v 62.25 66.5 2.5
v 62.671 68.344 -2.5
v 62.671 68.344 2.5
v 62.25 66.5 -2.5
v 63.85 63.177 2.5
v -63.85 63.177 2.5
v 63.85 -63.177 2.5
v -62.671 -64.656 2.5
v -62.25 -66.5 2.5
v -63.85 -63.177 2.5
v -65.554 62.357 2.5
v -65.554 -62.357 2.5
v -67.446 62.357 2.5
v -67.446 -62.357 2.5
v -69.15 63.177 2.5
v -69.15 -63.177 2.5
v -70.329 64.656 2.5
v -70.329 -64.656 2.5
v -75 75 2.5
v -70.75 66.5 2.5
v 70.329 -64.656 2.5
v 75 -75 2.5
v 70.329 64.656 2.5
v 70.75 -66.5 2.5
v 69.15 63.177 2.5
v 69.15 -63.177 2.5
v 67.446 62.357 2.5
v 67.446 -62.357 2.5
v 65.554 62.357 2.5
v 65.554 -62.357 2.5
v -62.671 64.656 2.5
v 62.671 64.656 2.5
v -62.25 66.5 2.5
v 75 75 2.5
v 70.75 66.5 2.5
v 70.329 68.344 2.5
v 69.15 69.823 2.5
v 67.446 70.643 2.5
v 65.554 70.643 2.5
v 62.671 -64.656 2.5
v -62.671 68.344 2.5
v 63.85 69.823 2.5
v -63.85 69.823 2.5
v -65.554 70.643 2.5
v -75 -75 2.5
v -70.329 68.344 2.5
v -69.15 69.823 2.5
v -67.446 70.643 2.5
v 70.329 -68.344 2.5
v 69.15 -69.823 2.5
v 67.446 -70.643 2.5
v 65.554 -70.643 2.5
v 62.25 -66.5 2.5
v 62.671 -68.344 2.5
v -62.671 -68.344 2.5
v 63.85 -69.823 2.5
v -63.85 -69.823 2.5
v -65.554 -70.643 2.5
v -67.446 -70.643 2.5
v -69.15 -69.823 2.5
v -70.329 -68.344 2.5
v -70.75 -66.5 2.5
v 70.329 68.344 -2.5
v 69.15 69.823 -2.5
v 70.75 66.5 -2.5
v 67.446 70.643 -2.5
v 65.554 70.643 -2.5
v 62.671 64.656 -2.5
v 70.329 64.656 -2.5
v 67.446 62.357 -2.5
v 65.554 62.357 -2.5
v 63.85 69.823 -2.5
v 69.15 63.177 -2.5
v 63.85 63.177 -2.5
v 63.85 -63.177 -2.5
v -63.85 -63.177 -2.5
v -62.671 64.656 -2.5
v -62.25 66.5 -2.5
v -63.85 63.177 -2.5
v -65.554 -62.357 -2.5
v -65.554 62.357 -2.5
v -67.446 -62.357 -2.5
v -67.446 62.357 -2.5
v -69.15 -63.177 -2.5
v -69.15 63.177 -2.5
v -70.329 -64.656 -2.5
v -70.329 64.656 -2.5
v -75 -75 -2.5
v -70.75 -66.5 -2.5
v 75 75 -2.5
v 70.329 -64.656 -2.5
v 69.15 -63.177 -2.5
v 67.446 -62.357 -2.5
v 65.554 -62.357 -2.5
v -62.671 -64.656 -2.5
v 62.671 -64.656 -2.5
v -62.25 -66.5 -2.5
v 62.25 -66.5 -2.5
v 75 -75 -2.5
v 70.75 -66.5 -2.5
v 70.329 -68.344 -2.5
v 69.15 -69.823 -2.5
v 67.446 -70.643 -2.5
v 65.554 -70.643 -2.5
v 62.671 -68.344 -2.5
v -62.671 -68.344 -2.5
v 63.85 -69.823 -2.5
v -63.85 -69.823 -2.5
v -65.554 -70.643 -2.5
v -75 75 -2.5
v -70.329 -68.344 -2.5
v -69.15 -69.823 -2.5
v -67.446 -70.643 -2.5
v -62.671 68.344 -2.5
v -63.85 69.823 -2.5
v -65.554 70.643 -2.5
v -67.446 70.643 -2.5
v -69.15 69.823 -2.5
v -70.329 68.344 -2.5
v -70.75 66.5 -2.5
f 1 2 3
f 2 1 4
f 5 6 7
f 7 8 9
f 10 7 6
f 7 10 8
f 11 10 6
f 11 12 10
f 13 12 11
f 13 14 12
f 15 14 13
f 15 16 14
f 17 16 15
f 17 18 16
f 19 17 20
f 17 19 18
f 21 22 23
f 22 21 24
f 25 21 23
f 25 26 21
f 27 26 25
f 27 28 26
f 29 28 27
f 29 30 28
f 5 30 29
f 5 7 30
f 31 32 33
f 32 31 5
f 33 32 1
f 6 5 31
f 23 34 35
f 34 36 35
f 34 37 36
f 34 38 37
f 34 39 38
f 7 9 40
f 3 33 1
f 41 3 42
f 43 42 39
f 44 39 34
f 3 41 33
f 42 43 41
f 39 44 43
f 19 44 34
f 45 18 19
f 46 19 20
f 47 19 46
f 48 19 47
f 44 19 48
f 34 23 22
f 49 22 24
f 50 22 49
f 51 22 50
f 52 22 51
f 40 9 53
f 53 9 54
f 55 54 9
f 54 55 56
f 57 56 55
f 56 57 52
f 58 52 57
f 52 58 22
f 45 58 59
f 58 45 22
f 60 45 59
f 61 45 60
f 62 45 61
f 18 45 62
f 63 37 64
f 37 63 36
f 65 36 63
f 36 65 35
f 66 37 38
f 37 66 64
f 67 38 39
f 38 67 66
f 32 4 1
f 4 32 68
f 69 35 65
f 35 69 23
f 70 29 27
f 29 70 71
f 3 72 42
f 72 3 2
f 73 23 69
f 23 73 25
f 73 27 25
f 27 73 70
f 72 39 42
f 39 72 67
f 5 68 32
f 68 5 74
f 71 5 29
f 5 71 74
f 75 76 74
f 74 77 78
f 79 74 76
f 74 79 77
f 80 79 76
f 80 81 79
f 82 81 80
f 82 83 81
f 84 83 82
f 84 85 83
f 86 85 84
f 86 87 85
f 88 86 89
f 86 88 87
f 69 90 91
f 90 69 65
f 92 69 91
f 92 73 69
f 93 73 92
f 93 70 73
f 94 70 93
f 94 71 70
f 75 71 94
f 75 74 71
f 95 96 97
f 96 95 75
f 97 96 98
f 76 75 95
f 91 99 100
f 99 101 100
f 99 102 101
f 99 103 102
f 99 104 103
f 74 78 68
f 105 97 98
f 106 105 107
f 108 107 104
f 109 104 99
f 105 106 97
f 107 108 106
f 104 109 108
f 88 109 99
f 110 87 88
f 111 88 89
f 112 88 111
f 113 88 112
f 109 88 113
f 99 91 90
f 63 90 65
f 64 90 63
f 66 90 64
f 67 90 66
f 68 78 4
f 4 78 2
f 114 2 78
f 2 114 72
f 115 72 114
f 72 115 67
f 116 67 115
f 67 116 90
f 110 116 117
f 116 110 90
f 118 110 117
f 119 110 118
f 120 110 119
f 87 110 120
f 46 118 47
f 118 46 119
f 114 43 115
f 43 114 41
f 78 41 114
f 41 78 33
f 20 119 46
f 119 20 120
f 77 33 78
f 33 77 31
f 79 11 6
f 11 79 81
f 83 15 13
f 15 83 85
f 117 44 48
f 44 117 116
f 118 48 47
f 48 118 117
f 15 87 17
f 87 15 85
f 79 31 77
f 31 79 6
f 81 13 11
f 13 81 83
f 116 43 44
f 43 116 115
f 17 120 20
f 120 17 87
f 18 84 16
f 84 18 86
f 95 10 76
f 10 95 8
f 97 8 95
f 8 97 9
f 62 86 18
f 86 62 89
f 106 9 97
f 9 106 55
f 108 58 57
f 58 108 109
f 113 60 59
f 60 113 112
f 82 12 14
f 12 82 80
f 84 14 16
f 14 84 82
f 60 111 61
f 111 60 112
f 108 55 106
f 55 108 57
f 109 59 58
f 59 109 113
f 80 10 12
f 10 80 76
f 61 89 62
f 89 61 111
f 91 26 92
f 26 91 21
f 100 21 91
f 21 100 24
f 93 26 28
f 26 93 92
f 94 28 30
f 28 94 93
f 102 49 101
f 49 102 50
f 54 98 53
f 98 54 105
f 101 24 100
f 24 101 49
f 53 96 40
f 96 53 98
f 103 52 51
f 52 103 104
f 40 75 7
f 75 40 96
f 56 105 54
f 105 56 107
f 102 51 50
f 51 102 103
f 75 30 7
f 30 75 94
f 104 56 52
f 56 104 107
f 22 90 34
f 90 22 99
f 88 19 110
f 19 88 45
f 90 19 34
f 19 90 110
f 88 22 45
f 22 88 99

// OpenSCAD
// Generated by SolidPython 1.1.3 on 2023-10-16 11:59:45


difference() {
	cube(center = true, size = [150, 150, 5]);
	union() {
		translate(v = [66.5000000000, 66.5000000000]) {
			cylinder(center = true, h = 5, r = 4.2500000000);
		}
		translate(v = [-66.5000000000, 66.5000000000]) {
			cylinder(center = true, h = 5, r = 4.2500000000);
		}
		translate(v = [-66.5000000000, -66.5000000000]) {
			cylinder(center = true, h = 5, r = 4.2500000000);
		}
		translate(v = [66.5000000000, -66.5000000000]) {
			cylinder(center = true, h = 5, r = 4.2500000000);
		}
	}
}
/***********************************************
*********      SolidPython code:      **********
************************************************
 
import solid
import numbers
import pudb
from solid.utils import *
import viewscad
import subprocess
import os
import os.path as osp
import math
import sys

chamfer_extrude=solid.import_scad("./chamfer_extrude.scad")
chamfer_extrude=chamfer_extrude.chamfer_extrude
r = viewscad.Renderer(width=800, height=800)

def debug(model,f_name,path="/home/ts/code/projects/mfd/designs/debug"):
    solid.scad_render_to_file(model,osp.join(path,f_name)+".scad")
#generate position list of wells using offset from center
wells_pos_from_center_4 = lambda offset: [[-offset,offset],
                                        [offset, offset],
                                        [-offset, -offset],
                                        [offset, -offset]]
#wells_pos_from_center_2 = lambda offset: [[0,offset],
#                                        [0, -offset]]
wells_pos_from_center_2 = lambda offset: [[offset,0],
                                        [-offset,0]]

def make_well(dims,shape=None,height=None,dxf=False):
    def circle_cylinder():
        if dxf or (height is None):
            well = solid.circle(r=dims, segments=64)
        else:
            well = solid.cylinder(r=dims, h=height, segments=64, center = True)
        return well
    if dims is None:
        sys.exit("radius needs to be a number")
    if isinstance(dims, numbers.Number):
        well =circle_cylinder()
    elif len(dims)==1:
        if isinstance(dims[1], numbers.Number):
            well =circle_cylinder()
        else:
            sys.exit("radius needs to be a number")
    elif len(dims)==2:
        well = solid.square(dims,center = True)
    elif len(dims)==3:
        well = solid.cube(dims, center = True)
    return well

def wells_top_bottom(center_gap,device_dims=None,shape=None,height=None, positions = None, dxf = False):
    well_shape = make_well(device_dims,shape=shape,height=height,dxf=dxf)
    wells = []
    if positions is None:
        offset = radius+radius/2.0
        positions = wells_pos_from_center_2(offset)
    if dxf or (height is None):
        height = 0
    for position in positions:
        if dxf:
            wells.append(solid.translate([position[0],position[1]])(well_shape))
        else:
            wells.append(solid.translate([position[0],position[1],height/2.0])(well_shape))
    return  union()(*wells)

#place wells in four corners 
def four_corner(radius,height=None, positions = None, dxf = False):
    #if well pos not specified set
    #to equally spaced by half radius
    if positions is None:
        offset = radius+radius/2.0
        positions = wells_pos_from_center_4(offset)
    if dxf or (height is None):
        height = 0
    #make wells at positions with specified radius and height
    wells = []
    for position in positions:
        #make circle if making dxf
        if dxf:
            well_shape = solid.circle(r=radius, segments=64)
            well_shape = solid.translate([position[0],position[1]])(well_shape)
        #if stl make cylinder
        else:
            well_shape = solid.cylinder(r=radius, h=height, segments=64, center = True)
            well_shape = solid.translate([position[0],position[1],height/2.0])(well_shape)
        wells.append(well_shape)
    return  union()(*wells)

#generate channels 
def make_channels(length,width,height=0,num_chans=1,max_chans=None,spacing=None, dxf = False,
                  rotate_channels=False):
    if dxf or (height is None):
        height = 0
    #if channel gap not defined, is equal to
    if spacing is None: spacing = width
    #calculate number of channels if fitting max num within given width
    if not max_chans is None:
        import math
        num_chans = math.floor((max_chans-spacing)/(width+spacing))
    #get total width of channel section  
    total_width = (width*num_chans)+(spacing*(num_chans-1))

    #make template channel
    #if rotate_channels: width, length = length, width
    if dxf:
        channel_t = solid.square([length,width],center = True)
    else:
        channel_t = solid.cube([length,width,height], center = True)

    #if number channels is even, offset the first channel to center its gap
    if num_chans % 2 == 0: centering = -(width/2.0+spacing/2.0)
    else: centering = 0
    #move template channel up to align bottom at z = 0 
    #and offset center if necessary
    if dxf:
        channel_t = solid.translate([0,centering])(channel_t)
    else:
        channel_t = solid.translate([0,centering,height/2.0])(channel_t)

    #if rotate_channels: length,width = width,length
    #start making the channels
    channels = []
    for i in range(num_chans):
        #if i=0 there is no translation
        #if i=1, we make the first channel adjacent to second
        direction = i

        #if i>=1, we add channels alternating left and right
        if i >= 1:
            direction = -(i/2.0)
            if i % 2 == 1: direction = (-direction)+0.5
                
        #make channel at right position and add it to channel list
        translation_coords = [0,direction*(width+spacing)]
        #if rotate_channels: translation_coords = [direction*(width+spacing),0]
        if dxf:
            channel = solid.translate(translation_coords)(channel_t)
        else:
            channel = solid.translate([*translation_coords,0])(channel_t)
        channels.append(channel)
    
    #group all channels as one object
    channels = union()(*channels)
    #compute the x,y,z dimensions in order to pass as arguments 
    #for construction of other parts of device (such as the chambers)
    measurements = {'x':(length/2.0,-length/2.0),
                    'y':(total_width/2.0,-total_width/2.0)}
    if not dxf:
        measurements['z'] = (height,0)
    if rotate_channels:
        channels = solid.rotate(90)(channels)
        measurements['x'],measurements['y']=measurements['y'],measurements['x']
    return channels,measurements

def make_chambers(msrs,height=None,extra=0,len_until=None,width=None, dxf = False):
    #computes x,y,z length
    total = lambda x : abs(x[0]) + abs(x[1])
    
    #if specific height if specified
    #otherwise use same height as channels
    if dxf:
        pass
    elif not height is None:
        msrs['z'] = (height,0)
    else:
        msrs['z'] = (0,0)
        
    #make copy of measurements from channels to modify chamber dimensions 
    #and add length to chambers as specified
    chamber_dims = msrs.copy()
    #calculate length of chamber to reach specified offset
    if not len_until is None:
        chamber_len = len_until-(msrs['x'][0])
    #or add specified length to channel length (if not specified, adds 0)
    else:
        chamber_len = msrs['x'][0]+extra
    #set the chamber length based 
    chamber_dims['x'] = (chamber_len/2.0,-(chamber_len/2.0))
    #compute final dimensions of chamber
    if not width is None:
        chamber_dims['y'] = (width/2.0,-width/2.0)
    chamber_dims = [total(size) for size in chamber_dims.values()]
        
    #calculate chamber translation offset to place adjacent to channels
    chamber_trslt = msrs['x'][0]+(chamber_len/2.0)
    #compute chamber translation coordinates to align with channels
    #x = 1 moves chamber above channels
    #x = -1 moves chamber below channels
    if dxf:
        trslt = lambda x : [x*(chamber_trslt),0]
    else:
        trslt = lambda x : [x*(chamber_trslt),0,msrs['z'][0]/2.0]
    
    #function to make chamber at top or at bottom 
    if dxf:
        move = lambda x : solid.translate(trslt(x))(solid.square(chamber_dims, center = True) )
    else:
        move = lambda x : solid.translate(trslt(x))(solid.cube(chamber_dims,center = True))
    #make top and bottom chambers and return them as grouped
    top = move(1)
    bottom = move(-1)
    #chambers=solid.rotate(90)(solid.union()(top,bottom))
    chambers=(solid.union()(top,bottom))

    return chambers

#create alignment features 
def alignment_features(unit,dims,grid_size, mask_size = None, alignment = "hollow", units_from_center = (2.5,2.5), corner_len=None):
    width = grid_size[0]*dims[0]
    length = grid_size[1]*dims[1]
    if mask_size is None and corner_len is None:
        corner_len = (dims[0] + dims[1]) /2 / 8
    corner = lambda thickness_div : solid.union()( solid.square([corner_len,corner_len/thickness_div],center=False), solid.square([corner_len/thickness_div,corner_len],center=False) )
    
    def make_full(thickness_div):
        thickness = corner_len/thickness_div
        tr = solid.translate([0, 0, 0 ])(solid.rotate(180)(corner(thickness_div)))
        tr = solid.translate([thickness/2,thickness/2,0])(tr)
        bl = solid.translate([0, 0, 0 ])(solid.rotate(0)(corner(thickness_div)))
        bl = solid.translate([-thickness/2,-thickness/2,0])(bl)
        return solid.union()(tr,bl)
    
    def make_hollow(thickness_div):
        thickness = corner_len/(thickness_div/2)
        inner = make_full(thickness_div)
        outer = make_full(thickness_div/2)
        hollow = outer - inner 
        return hollow
    
    center = (width /2 , length/2)
    mask_pos = lambda x,y : (center[0] + x*(float(units_from_center[0])*dims[0]), center[1] + y*(float(units_from_center[1])*dims[1]))
    positions = []
    positions.append(mask_pos(1,0))
    positions.append(mask_pos(0,1))
    positions.append(mask_pos(-1,0))
    positions.append(mask_pos(0,-1))
    make_mask = lambda mtype : make_hollow(8) if mtype == "hollow" else make_full(8)
    masks = [ solid.translate([*position,0])(make_mask(alignment)) for position in positions]
    
    solid.scad_render_to_file(solid.union()(*masks),"./designs/open_chamber/masks.scad")
    #return unit - solid.union()(*masks)
    return solid.union()(*masks,unit)

def create_outline(thickness, array, dims, grid_size,):
    width = grid_size[0]*dims[0] + thickness *2
    length = grid_size[1]*dims[1] + thickness *2
    outer = solid.translate([-thickness, -thickness,0])(solid.square([width, length]))
    return outer-array

def create_wall(wall_thickness, outline_thickness, dims, grid_size, wall_height = 2000, dxf = False):
    inner_width = grid_size[0]*dims[0] + outline_thickness *2
    inner_length = grid_size[1]*dims[1] + outline_thickness *2
    outer_width = inner_width + wall_thickness * 2
    outer_length = inner_length + wall_thickness * 2
    outer_pos_x = -outline_thickness-wall_thickness
    outer_pos_y = -outline_thickness-wall_thickness
    inner_pos_x = -outline_thickness
    inner_pos_y = -outline_thickness
    if dxf:
        inner_wall = solid.translate([inner_pos_x,
                                      inner_pos_y,
                                      0])(solid.square([inner_width, inner_length]))
        outer_wall = solid.translate([outer_pos_x,
                                      outer_pos_y,
                                      0])(solid.square([outer_width, outer_length]))

        return outer_wall-inner_wall
    else:
        inner_wall = solid.translate([inner_pos_x,
                                      inner_pos_y,
                                      0])(solid.cube([inner_width, inner_length,wall_height]))
        outer_wall = solid.translate([outer_pos_x,
                                      outer_pos_y,
                                      0])(solid.cube([outer_width, outer_length,wall_height]))

        return outer_wall-inner_wall, {'wall_height': wall_height,
                                       'wall_thickness': wall_thickness,
                                       'inner_width':inner_width,
                                       'inner_length': inner_length,
                                       'outer_width': outer_width,
                                       'outer_length': outer_length,
                                       'outer_pos_x' : outer_pos_x,
                                       'outer_pos_y' : outer_pos_y,
                                       'inner_pos_x' : inner_pos_x,
                                       'inner_pos_y' : inner_pos_y}

def create_thicker_wall(wall_thickness, outer_wall_offset, wall_dims, dims, grid_size, height_start = .2, height_end=2, dxf = False):
    addon_wall,thicker_wall_dims = create_wall(wall_thickness, outer_wall_offset, dims, grid_size, wall_height=height_end-height_start, dxf = False)
    addon_wall = solid.translate([0,0,height_start])(addon_wall)

    thicker_wall_dims['wall_height'] = height_end
    thicker_wall_dims['wall_thickness'] = wall_dims['wall_thickness'] + wall_thickness
    return addon_wall, thicker_wall_dims
 
def add_lock_to_wall(wall,wall_dims,y_offset = 0,cut_ratio=0.7,L_length=3, gap_ratio=0.05, axis="x",width_ratio=1/2):
    # Makes L shape
    def make_L(max_length,length_thickness,max_width,width_thickness,height,y_offset):
        length = solid.cube([max_length,length_thickness,height])
        width = solid.cube([width_thickness,max_width,height])
        width = solid.translate([max_length-(width_thickness),0,0])(width)
        L = solid.union()(width,length)
        debug(L,"L")
        if axis == "x":
            L = solid.rotate(-90)(L)
            L = solid.translate([0,max_length,0])(L)
        else:
            L = solid.rotate(-180)(L)
            L = solid.translate([max_length,max_width,0])(L)
        return solid.translate([0,0,y_offset])(L)
    
    lock_length = L_length
    lock_width = wall_dims['wall_thickness']*width_ratio
    lock_length_thickness = lock_width/2
    lock_width_thickness = lock_width/2
    L_lock = make_L(lock_length,lock_length_thickness,lock_width,lock_width_thickness, wall_dims['wall_height']-y_offset, y_offset)
    
    margin_space = lock_length - lock_length*(1-gap_ratio)
    key_length = lock_length-margin_space
    key_length_thickness = lock_length_thickness-(margin_space*2)
    key_width = lock_width-(margin_space*2)
    key_width_thickness = lock_width_thickness-(margin_space*2)
    L_key = make_L(key_length,key_length_thickness,key_width,key_width_thickness, wall_dims['wall_height']-y_offset, y_offset)
    L_key = solid.translate([margin_space,margin_space,0])(L_key)
    L = solid.union()(L_lock,L_key)
    debug(L,"L")
    
    #Make cube to be used as negative to split frame in a half
    #Can choose if making left or right negative, specify ratio of split
    def make_negative(right,cut_ratio):
        if axis == "x":
            if right:
                length = wall_dims['outer_length']*(1-cut_ratio)
                pos_x = wall_dims['outer_pos_x']+(wall_dims['outer_length']*cut_ratio)
            else:
                length = wall_dims['outer_length']*(cut_ratio)
                pos_x = wall_dims['outer_pos_x'] 
            negative = solid.cube([wall_dims['outer_width'],length, wall_dims['wall_height']])
            negative = solid.translate([wall_dims['outer_pos_y'],pos_x,0])(negative)
        else:
            if right:
                length = wall_dims['outer_width']*(1-cut_ratio)
                pos_x = wall_dims['outer_pos_y']+(wall_dims['outer_width']*cut_ratio)
            else:
                length = wall_dims['outer_width']*(cut_ratio)
                pos_x = wall_dims['outer_pos_y'] 
            negative = solid.cube([length,wall_dims['outer_length'], wall_dims['wall_height']])
            negative = solid.translate([pos_x,wall_dims['outer_pos_x'],0])(negative)
        return negative, pos_x, length 
                      
    #Make negatives
    negative_right, right_half_pos_x, right_half_length = make_negative(True,cut_ratio)
    negative_left, left_half_pos_x, right_half_length = make_negative(False,cut_ratio)
    #Make halves
    left_half = solid.difference()(wall,negative_right)
    right_half = solid.difference()(wall,negative_left)
    def place_L(L, L_length,L_width):
        #Place L on top wall       
        offset_to_center = (wall_dims['wall_thickness']-L_width)/2
        if axis == "x":
            y_pos_top = (wall_dims['outer_pos_y'] +
                    wall_dims['outer_width'] - 
                    L_width - offset_to_center)
            top_L = solid.translate([y_pos_top,
                                     right_half_pos_x-(L_length),
                                     0])(L)
            #Place L on bottom wall       
            y_pos_bottom = wall_dims['outer_pos_y']+offset_to_center
            bottom_L = solid.translate([y_pos_bottom,
                                        right_half_pos_x-L_length,
                                        0])(L)
        else:
            y_pos_top = (wall_dims['outer_pos_x'] +
                    wall_dims['outer_length'] -
                    (L_width+offset_to_center))
            top_L = solid.translate([right_half_pos_x-L_length,
                                     y_pos_top,
                                     0])(L)
            #Place L on bottom wall       
            y_pos_bottom = wall_dims['outer_pos_y']+offset_to_center
            bottom_L = solid.translate([right_half_pos_x-L_length,
                                        y_pos_bottom,
                                        0])(L)
        return bottom_L, top_L
    #Make complimentary L pieces through union and differences
    #Make Lock
    bottom_L_lock, top_L_lock = place_L(L_lock,L_length,lock_width)
    left_half = solid.difference()(left_half,bottom_L_lock)
    left_half = solid.difference()(left_half,top_L_lock)
    #Make Key
    bottom_L_key, top_L_key = place_L(L_key,L_length,lock_width)
    right_half = solid.union()(right_half,bottom_L_key)
    right_half = solid.union()(right_half,top_L_key)
    return left_half, right_half


#build a row x col grid of containment units
def make_unit_array(unit,dims,grid_size, dxf = False, alignment = None, mask_size = None,
                    units_from_center = None,alignment_offset=None, alignment_mark_size=1):
    units = []
    for col in range(grid_size[1]):
        for row in range(grid_size[0]):
            if dxf:
                units.append(solid.translate([row*dims[0],col*dims[1]])(unit))
            else:
                units.append(solid.translate([row*dims[0],col*dims[1],dims[2]/2.0])(unit))
    array = solid.union()(*units)
    if (not alignment is None) and dxf:
        if not alignment_offset is None:
            array = solid.translate([alignment_offset[0],alignment_offset[1]])(array)
        array = alignment_features(array,dims, grid_size, alignment = alignment, mask_size = None, units_from_center = units_from_center,corner_len=alignment_mark_size)
        if not alignment_offset is None:
            array = solid.translate([-alignment_offset[0],-alignment_offset[1]])(array)
    return array


def make_taylor(wells_pos = wells_pos_from_center_4(2.25), well_rad = 1.5 ,
                well_height = 2, chan_w = 0.01, chan_l = 1, chan_h = 0.010 ,
                chan_gap = 0.040, max_chans = None,num_chans=100, chamber_height  = 0.100,
                columns = 1, rows = 1, chamber_len_until=2.25, add_channels = True, add_wells = True, 
                add_chambers = True, save_path = "./", alignment = None, units_from_center = 2,
                mask_size = None, render_stl = False, outline_thickness = 0.050, dxf = True,
                wall_height = 15, wall_thickness = 0.95, casing_x=9, casing_y=9, casing_z=0,rotate_units=0):

    dims = [casing_x, casing_y, casing_z]
    wells = four_corner(well_rad,well_height, dxf = dxf, positions = wells_pos)
    debug(wells,"wells")
    channels, msrs = make_channels(chan_l,chan_w,chan_h,dxf=dxf, spacing = chan_gap, max_chans=max_chans,num_chans=num_chans)
    debug(channels,"channels")
    chambers = make_chambers(msrs,dxf = dxf, height=chamber_height,len_until=chamber_len_until)
    debug(chambers,"chambers")

    #add together and render
    device_parts = []
    if add_channels:
        device_parts.append(channels)
    if add_wells:
        device_parts.append(wells)
    if add_chambers:
        device_parts.append(chambers)
    device=union()(*device_parts)
    device = rotate(rotate_units)(device)

    device=solid.translate([dims[0]/2.0,dims[1]/2.0,0])(device)
    channels = rotate(rotate_units)(channels)
    channels=solid.translate([dims[0]/2,dims[1]/2,0])(channels)
    chambers_wells = union()(wells,chambers)
    chambers_wells = rotate(rotate_units)(chambers_wells)
    chambers_wells=solid.translate([dims[0]/2,dims[1]/2,0])(chambers_wells)

    file_name = str(rows)+'x'+str(columns)+'_units_'
    grid_size = [rows,columns]

    if alignment:
        alignment="full"
    device = make_unit_array(device,dims,grid_size, dxf=dxf, alignment = alignment,
                                 units_from_center = units_from_center)
    channels = make_unit_array(channels,dims,grid_size, dxf=dxf, alignment = alignment,
                                 units_from_center = units_from_center)
    if alignment=="full":
        alignment="hollow"

    chambers_wells = make_unit_array(chambers_wells,dims,grid_size, dxf=dxf, alignment = alignment,
                                 units_from_center =units_from_center)

    def save_model(model,prefix):
        model_fname = os.path.abspath(save_path+prefix+"_"+file_name+".scad")
        solid.scad_render_to_file(model,model_fname)
        return model_fname

    wells_fname = save_model(wells,"wells")
    channels_fname = save_model(channels,"channels")
    device_fname = save_model(device,"device")
    chambers_wells_fname = save_model(chambers_wells,"chambers_wells")
    return (chambers_wells,chambers_wells_fname), (channels,channels_fname), (device,device_fname)

def make_device(design='open',rows=8,columns=6,wells_pos = 4.5,well_offset=3.2, well_rad=3.2,well_height=0.1,
                chan_l=1,chan_w=0.01,chan_h=0.01,chan_gap=0.015,num_chans=101,dxf=True,save_path="./designs/open_chamber/",
                casing_x=9.0,casing_y=18.0,casing_z=0,rotate_units=90,units_from_center=(3,1),chamber_len_until=4.5,
                chamber_width=None,alignment=True, add_wells=True, add_channels=True,add_chambers=True):

    dims = [casing_x, casing_y, casing_z]
    if design == "open":
        wells_pos=wells_pos_from_center_2(wells_pos)
        wells = wells_top_bottom(well_offset*2,device_dims=well_rad,height=well_height, dxf = dxf, positions = wells_pos)
    elif design == "closed":
        wells_pos=wells_pos_from_center_4(wells_pos)
        debug(wells,"wells")
        wells = four_corner(well_offset,well_heightdevice_dims=well_rad, dxf = dxf, positions = wells_pos)
    else:
        print(design+" is not a valid design.\n Choose valid design: 'open' or 'closed'")
        exit()
    wells = rotate(rotate_units)(wells)
    wells=solid.translate([dims[0]/2,dims[1]/2,0])(wells)
    debug(wells,"wells")

    channels, msrs = make_channels(chan_l,chan_w,chan_h,dxf=dxf, spacing = chan_gap, num_chans=num_chans,rotate_channels=False)
    channels = rotate(rotate_units)(channels)
    channels=solid.translate([dims[0]/2,dims[1]/2,0])(channels)

    chambers=make_chambers(msrs,height=None,extra=0,len_until=chamber_len_until, width=chamber_width,dxf = dxf)
    chambers = rotate(rotate_units)(chambers)
    chambers=solid.translate([dims[0]/2,dims[1]/2,0])(chambers)

    device_parts = []
    if add_channels:
        device_parts.append(channels)
    if add_wells:
        device_parts.append(wells)
    if add_chambers:
        device_parts.append(chambers)
    device = union()(*device_parts)
    #device = rotate(rotate_units)(device)
    #device=solid.translate([dims[0]/2.0,dims[1]/2.0,0])(device)

    chambers_wells = []
    if add_chambers:
        chambers_wells.append(chambers)
    if add_wells:
        chambers_wells.append(wells)
    chambers_wells = union()(*chambers_wells)
    #chambers_wells = union()(wells,chambers)
    #chambers_wells = rotate(rotate_units)(chambers_wells)
    #chambers_wells=solid.translate([dims[0]/2,dims[1]/2,0])(chambers_wells)

    file_name = str(rows)+'x'+str(columns)+'_units_'

    grid_size = [rows,columns]
    if alignment:
        alignment="full"
    device = make_unit_array(device,dims,grid_size, dxf=dxf, alignment = alignment,
                                 units_from_center = units_from_center)
    channels = make_unit_array(channels,dims,grid_size, dxf=dxf, alignment = alignment,
                                 units_from_center = units_from_center)
    if alignment=="full":
        alignment="hollow"

    chambers_wells = make_unit_array(chambers_wells,dims,grid_size, dxf=dxf, alignment = alignment,
                                 units_from_center =units_from_center)

    def save_model(model,prefix):
        model_fname = os.path.abspath(save_path+prefix+"_"+file_name+".scad")
        solid.scad_render_to_file(model,model_fname)
        return model_fname

    wells_fname = save_model(wells,"wells")
    channels_fname = save_model(channels,"channels")
    device_fname = save_model(device,"device")
    chambers_wells_fname = save_model(chambers_wells,"chambers_wells")
    return (chambers_wells,chambers_wells_fname), (channels,channels_fname), (device,device_fname)


def make_open_chamber(rows=8,columns=6,wells_pos = wells_pos_from_center_2(4.5), well_rad=3.2,well_height=0.1,
                      chan_l=1,chan_w=0.01,chan_h=0.01,chan_gap=0.015,num_chans=101,dxf=True,save_path="./designs/open_chamber/",
                      casing_x=9.0,casing_y=18.0,casing_z=0,rotate_units=90,units_from_center=(3,1),chamber_len_until=4.5,
                      chamber_width=None,alignment=True, add_wells=True, add_channels=True,add_chambers=True):

    dims = [casing_x, casing_y, casing_z]
    wells = wells_top_bottom(well_rad,height=well_height, dxf = dxf, positions = wells_pos)
    channels, msrs = make_channels(chan_l,chan_w,chan_h,dxf=dxf, spacing = chan_gap, num_chans=num_chans,rotate_channels=False)
    chambers=make_chambers(msrs,height=None,extra=0,len_until=chamber_len_until, width=chamber_width,dxf = dxf)
    debug(chambers,"chambers")
    device_parts = []
    if add_channels:
        device_parts.append(channels)
    if add_wells:
        device_parts.append(wells)
    if add_chambers:
        device_parts.append(chambers)
    device = union()(*device_parts)
    device = rotate(rotate_units)(device)
    device=solid.translate([dims[0]/2.0,dims[1]/2.0,0])(device)
    channels = rotate(rotate_units)(channels)
    channels=solid.translate([dims[0]/2,dims[1]/2,0])(channels)
    chambers_wells = union()(wells,chambers)
    chambers_wells = rotate(rotate_units)(chambers_wells)
    chambers_wells=solid.translate([dims[0]/2,dims[1]/2,0])(chambers_wells)

    file_name = str(rows)+'x'+str(columns)+'_units_'

    grid_size = [rows,columns]
    if alignment:
        alignment="full"
    device = make_unit_array(device,dims,grid_size, dxf=dxf, alignment = alignment,
                                 units_from_center = units_from_center)
    channels = make_unit_array(channels,dims,grid_size, dxf=dxf, alignment = alignment,
                                 units_from_center = units_from_center)
    if alignment=="full":
        alignment="hollow"

    chambers_wells = make_unit_array(chambers_wells,dims,grid_size, dxf=dxf, alignment = alignment,
                                 units_from_center =units_from_center)

    def save_model(model,prefix):
        model_fname = os.path.abspath(save_path+prefix+"_"+file_name+".scad")
        solid.scad_render_to_file(model,model_fname)
        return model_fname

    wells_fname = save_model(wells,"wells")
    channels_fname = save_model(channels,"channels")
    device_fname = save_model(device,"device")
    chambers_wells_fname = save_model(chambers_wells,"chambers_wells")
    return (chambers_wells,chambers_wells_fname), (channels,channels_fname), (device,device_fname)

def to_dxf(scad_path):
    dxf_path = scad_path.replace(".scad",".dxf")
    subprocess.call(["openscad", "-o", dxf_path, scad_path])
    import ezdxf
    temp_dxf = ezdxf.readfile(dxf_path)
    temp_dxf.saveas(dxf_path)

#def make_walls(diameter,thickness,grid_size,dims,height=20,segments=256,make_inner=True):
#    wafer_wall_out = solid.cylinder(r=diameter/2,h=height, segments=segments)
#    wafer_wall_in = solid.cylinder(r=(diameter/2-thickness),h=height, segments=segments)
#    wafer_wall = solid.difference()(wafer_wall_out,wafer_wall_in)
#    wafer_wall = solid.translate([grid_size[1]*dims[1]/2.0,grid_size[0]*dims[0]/2.0])(wafer_wall)
#
#    vertical_wall_length = grid_size[1]*dims[1]
#    horizontal_wall_length = grid_size[0]*dims[0]
#    vertical_wall = solid.cube([vertical_wall_length,thickness,height],center = True)
#    vertical_wall = solid.translate([vertical_wall_length/2,0,height/2])(vertical_wall)
#    horizontal_wall = solid.cube([thickness,horizontal_wall_length,height],center = True)
#    horizontal_wall = solid.translate([0,vertical_wall_length/2,height/2])(horizontal_wall)
#    walls = []
#    walls.append(horizontal_wall)
#    walls.append(vertical_wall)
#    for col in range(grid_size[1]):
#        if col == grid_size[1]-1: 
#            walls.append(solid.translate([0,(col+1)*dims[1]])(vertical_wall))
#        elif col > 0 and col < grid_size[1]-1 and make_inner==True:
#            walls.append(solid.translate([0,(col+1)*dims[1]])(vertical_wall))
#    for row in range(grid_size[0]):
#        if row == grid_size[0]-1: 
#            walls.append(solid.translate([(row+1)*dims[0],0])(horizontal_wall))
#        elif row > 0 and row < grid_size[0]-1 and make_inner==True:
#            walls.append(solid.translate([(row+1)*dims[0],0])(horizontal_wall))
#    walls = union()(*walls)
#    wafer_walls = union()(walls,wafer_wall)
#    return walls,wafer_wall,wafer_walls

def make_walls(diameter,thickness,grid_size,dims,height=20,segments=256,make_inner=True,padx=0,pady=0):
    wafer_wall_out = solid.cylinder(r=diameter/2,h=height, segments=segments)
    wafer_wall_in = solid.cylinder(r=(diameter/2-thickness),h=height, segments=segments)
    wafer_wall = solid.difference()(wafer_wall_out,wafer_wall_in)
    wafer_wall = solid.translate([grid_size[1]*dims[1]/2.0,grid_size[0]*dims[0]/2.0])(wafer_wall)

    vertical_wall_length = grid_size[0]*dims[0]+padx
    horizontal_wall_length = grid_size[1]*dims[1]+pady
    vertical_wall = solid.cube([vertical_wall_length,thickness,height],center = True)
    vertical_wall = solid.translate([vertical_wall_length/2-pady/2,-padx/2,height/2])(vertical_wall)
    horizontal_wall = solid.cube([thickness,horizontal_wall_length,height],center = True)
    horizontal_wall = solid.translate([-pady/2,horizontal_wall_length/2-padx/2,height/2])(horizontal_wall)
    walls = []
    walls.append(horizontal_wall)
    walls.append(vertical_wall)
    for col in range(grid_size[1]):
        if col == grid_size[1]-1: 
            walls.append(solid.translate([0,(col+1)*dims[1]+pady])(vertical_wall))
        elif col > 0 and col < grid_size[1]-1 and make_inner==True:
            walls.append(solid.translate([0,(col+1)*dims[1]])(vertical_wall))
    for row in range(grid_size[0]):
        if row == grid_size[0]-1: 
            walls.append(solid.translate([(row+1)*dims[0]+padx,0])(horizontal_wall))
        elif row > 0 and row < grid_size[0]-1 and make_inner==True:
            walls.append(solid.translate([(row+1)*dims[0],0])(horizontal_wall))
    walls = union()(*walls)
    wafer_walls = union()(walls,wafer_wall)
    return walls,wafer_wall,wafer_walls

def save_model(model,base_path,base_name,dxf=True):
    if not os.path.exists(base_path):
        os.makedirs(base_path)
    dxf_path=osp.join(base_path,base_name+".scad")
    solid.scad_render_to_file(model,osp.join(dxf_path))
    if dxf:
        to_dxf(dxf_path)

def make_wafer(diameter,flat_len,thickness):
    wafer = solid.cylinder(r1=diameter/2,r2=diameter/2,h=thickness,segments=512,)()
    x_start_flat=(flat_len/2)
    y_start_flat = math.sqrt(((diameter/2)**2) - (x_start_flat**2) )
    height_delete_flat=diameter/2-y_start_flat
    flat_delete = solid.cube([flat_len,height_delete_flat,thickness],center=False)()
    flat_delete = solid.translate([-flat_len/2,y_start_flat,0])(flat_delete)
    wafer = solid.difference()(wafer,flat_delete)
    wafer = solid.rotate(90)(wafer)
    return wafer

def add_wafer_to_mask(wafer_size,flat_len,mask,grid_size,dims,wafer_line_thickness=0.1,outer_mask_thickness=5,alignment_offset=None):
    def make_wafer_mask(wafer_size,flat_len):
        wafer_mask = make_wafer(wafer_size,flat_len,1)
        wafer_mask = solid.projection()(wafer_mask)
        wafer_mask = solid.translate([grid_size[0]*dims[0]/2.0,grid_size[1]*dims[1]/2.0])(wafer_mask)
        if not alignment_offset is None:
            wafer_mask = solid.translate([-alignment_offset[0],-alignment_offset[1]])(wafer_mask)
        return wafer_mask

    inner_wafer_line_mask = make_wafer_mask(wafer_size-wafer_line_thickness/2,flat_len)
    outer_wafer_line_mask = make_wafer_mask(wafer_size+wafer_line_thickness/2,flat_len)
    outer_wafer_mask = make_wafer_mask(wafer_size+outer_mask_thickness,flat_len)
    outer_wafer_mask = solid.difference()(outer_wafer_mask,outer_wafer_line_mask)
    wafer_mask = solid.union()(outer_wafer_mask,inner_wafer_line_mask)

    return solid.difference()(wafer_mask,mask)

def make_posts(post_shape,post_height):
    posts = solid.linear_extrude(height=post_height)(post_shape)
    return posts

def make_wafer_empty(diameter,flat_len,thickness,margin,notch_len=20,notch_height=5,oversize=1.01):
    diameter*=oversize
    flat_len*=oversize
    wafer = make_wafer(diameter,flat_len,thickness)
    holder = solid.cylinder(r1=diameter/2+margin,r2=diameter/2+margin,h=thickness,segments=512)()
    holder = solid.difference()(holder,wafer)

    x_start_flat=(flat_len/2)
    y_start_flat = math.sqrt(((diameter/2)**2) - (x_start_flat**2) )
    height_delete_flat=diameter/2-y_start_flat
    notch = solid.cube([notch_len,notch_height,thickness],center=False)()
    notch = solid.translate([-notch_len/2,y_start_flat,0])(notch)
    notch = solid.rotate(90)(notch)
    return solid.difference()(holder,notch)

def wafer_print_calibration(diameter,thickness,height,z_offset):
    circles = []
    radii = []
    radii.append(diameter/2.0*0.8)
    radii.append(diameter/2.0*0.6)
    radii.append(diameter/2.0*0.4)
    radii.append(diameter/2.0*0.2)
    for radius in radii:
        inner = solid.cylinder(r1=radius-(thickness/2.0),r2=radius-(thickness/2.0),h=thickness,segments=512,)()
        outer = solid.cylinder(r1=radius+(thickness/2.0),r2=radius+(thickness/2.0),h=thickness,segments=512,)()
        diff = solid.difference()(outer,inner)
        circles.append(diff)
    circles = solid.union()(*circles)
    circles = solid.translate([0,0,z_offset])(circles)
    return circles

def make_rack(wells,dims,grid_size,alignment_offset,rack_x,rack_y,rack_thickness,bolt_width,add_bolts=True):

    #get X and Y dimensions of gride of pipette tips
    X_len = dims[0]*grid_size[0]
    Y_len = dims[1]*grid_size[1]
    #make rack
    rack = solid.cube([rack_x,rack_y,rack_thickness],center=True)

    if add_bolts:
    #add bolt holes
        bolt_hole=solid.cylinder(r=bolt_width/2,h=rack_thickness,center=True)()
        bolt_holes = []
        bolt_holes.append(solid.translate([rack_x/2-1.5*bolt_width,rack_y/2-1.5*bolt_width])(bolt_hole))
        bolt_holes.append(solid.translate([-rack_x/2+1.5*bolt_width,rack_y/2-1.5*bolt_width])(bolt_hole))
        bolt_holes.append(solid.translate([-rack_x/2+1.5*bolt_width,-rack_y/2+1.5*bolt_width])(bolt_hole))
        bolt_holes.append(solid.translate([rack_x/2-1.5*bolt_width,-rack_y/2+1.5*bolt_width])(bolt_hole))
        bolt_holes = solid.union()(*bolt_holes)
        rack=solid.difference()(rack,bolt_holes)
    rack_support = rack

    #center rack with pipette holes
    rack = solid.translate([0,0,rack_thickness/2])(rack)
    rack = solid.translate([X_len/2,Y_len/2])(rack)
    rack = solid.translate([-alignment_offset[0],-alignment_offset[1]])(rack)
    wells = solid.linear_extrude(height=rack_thickness)(wells)
    rack = solid.difference()(rack,wells)
    return rack, rack_support

def make_pillar(wells,dims,grid_size,alignment_offset,rack_x,rack_y,pillar_height,rack_thickness,bolt_width,add_bolts=True,taper_angle=1,bolt_position_corner=1.5):

    #get X and Y dimensions of gride of pipette tips
    X_len = dims[0]*grid_size[0]
    Y_len = dims[1]*grid_size[1]
    #make rack
    rack = solid.cube([rack_x,rack_y,rack_thickness],center=True)
    
    if add_bolts:
    #add bolt holes
        bolt_hole=solid.cylinder(r=bolt_width/2,h=rack_thickness,center=True)()
        bolt_holes = []
        bolt_holes.append(solid.translate([rack_x/2-bolt_position_corner*bolt_width,rack_y/2-bolt_position_corner*bolt_width])(bolt_hole))
        bolt_holes.append(solid.translate([-rack_x/2+bolt_position_corner*bolt_width,rack_y/2-bolt_position_corner*bolt_width])(bolt_hole))
        bolt_holes.append(solid.translate([-rack_x/2+bolt_position_corner*bolt_width,-rack_y/2+bolt_position_corner*bolt_width])(bolt_hole))
        bolt_holes.append(solid.translate([rack_x/2-bolt_position_corner*bolt_width,-rack_y/2+bolt_position_corner*bolt_width])(bolt_hole))
        bolt_holes = solid.union()(*bolt_holes)
        rack=solid.difference()(rack,bolt_holes)
    rack_support = rack

    #center rack with pipette holes
    #rack = solid.translate([0,0,-rack_thickness])(rack)
    rack = solid.translate([X_len/2,Y_len/2])(rack)
    rack = solid.translate([-alignment_offset[0],-alignment_offset[1]])(rack)
    if not taper_angle == 0:
        wells=chamfer_extrude(pillar_height,taper_angle,segments=20)(wells)
    else:
        wells = solid.linear_extrude(height=pillar_height)(wells)
    rack = solid.union()(rack,wells)
    return rack, rack_support

def deg_taper_len(height,deg):
    if not deg == 0:
        return height*math.tan(math.radians(deg))
    else:
        return 0









 
 
************************************************/
